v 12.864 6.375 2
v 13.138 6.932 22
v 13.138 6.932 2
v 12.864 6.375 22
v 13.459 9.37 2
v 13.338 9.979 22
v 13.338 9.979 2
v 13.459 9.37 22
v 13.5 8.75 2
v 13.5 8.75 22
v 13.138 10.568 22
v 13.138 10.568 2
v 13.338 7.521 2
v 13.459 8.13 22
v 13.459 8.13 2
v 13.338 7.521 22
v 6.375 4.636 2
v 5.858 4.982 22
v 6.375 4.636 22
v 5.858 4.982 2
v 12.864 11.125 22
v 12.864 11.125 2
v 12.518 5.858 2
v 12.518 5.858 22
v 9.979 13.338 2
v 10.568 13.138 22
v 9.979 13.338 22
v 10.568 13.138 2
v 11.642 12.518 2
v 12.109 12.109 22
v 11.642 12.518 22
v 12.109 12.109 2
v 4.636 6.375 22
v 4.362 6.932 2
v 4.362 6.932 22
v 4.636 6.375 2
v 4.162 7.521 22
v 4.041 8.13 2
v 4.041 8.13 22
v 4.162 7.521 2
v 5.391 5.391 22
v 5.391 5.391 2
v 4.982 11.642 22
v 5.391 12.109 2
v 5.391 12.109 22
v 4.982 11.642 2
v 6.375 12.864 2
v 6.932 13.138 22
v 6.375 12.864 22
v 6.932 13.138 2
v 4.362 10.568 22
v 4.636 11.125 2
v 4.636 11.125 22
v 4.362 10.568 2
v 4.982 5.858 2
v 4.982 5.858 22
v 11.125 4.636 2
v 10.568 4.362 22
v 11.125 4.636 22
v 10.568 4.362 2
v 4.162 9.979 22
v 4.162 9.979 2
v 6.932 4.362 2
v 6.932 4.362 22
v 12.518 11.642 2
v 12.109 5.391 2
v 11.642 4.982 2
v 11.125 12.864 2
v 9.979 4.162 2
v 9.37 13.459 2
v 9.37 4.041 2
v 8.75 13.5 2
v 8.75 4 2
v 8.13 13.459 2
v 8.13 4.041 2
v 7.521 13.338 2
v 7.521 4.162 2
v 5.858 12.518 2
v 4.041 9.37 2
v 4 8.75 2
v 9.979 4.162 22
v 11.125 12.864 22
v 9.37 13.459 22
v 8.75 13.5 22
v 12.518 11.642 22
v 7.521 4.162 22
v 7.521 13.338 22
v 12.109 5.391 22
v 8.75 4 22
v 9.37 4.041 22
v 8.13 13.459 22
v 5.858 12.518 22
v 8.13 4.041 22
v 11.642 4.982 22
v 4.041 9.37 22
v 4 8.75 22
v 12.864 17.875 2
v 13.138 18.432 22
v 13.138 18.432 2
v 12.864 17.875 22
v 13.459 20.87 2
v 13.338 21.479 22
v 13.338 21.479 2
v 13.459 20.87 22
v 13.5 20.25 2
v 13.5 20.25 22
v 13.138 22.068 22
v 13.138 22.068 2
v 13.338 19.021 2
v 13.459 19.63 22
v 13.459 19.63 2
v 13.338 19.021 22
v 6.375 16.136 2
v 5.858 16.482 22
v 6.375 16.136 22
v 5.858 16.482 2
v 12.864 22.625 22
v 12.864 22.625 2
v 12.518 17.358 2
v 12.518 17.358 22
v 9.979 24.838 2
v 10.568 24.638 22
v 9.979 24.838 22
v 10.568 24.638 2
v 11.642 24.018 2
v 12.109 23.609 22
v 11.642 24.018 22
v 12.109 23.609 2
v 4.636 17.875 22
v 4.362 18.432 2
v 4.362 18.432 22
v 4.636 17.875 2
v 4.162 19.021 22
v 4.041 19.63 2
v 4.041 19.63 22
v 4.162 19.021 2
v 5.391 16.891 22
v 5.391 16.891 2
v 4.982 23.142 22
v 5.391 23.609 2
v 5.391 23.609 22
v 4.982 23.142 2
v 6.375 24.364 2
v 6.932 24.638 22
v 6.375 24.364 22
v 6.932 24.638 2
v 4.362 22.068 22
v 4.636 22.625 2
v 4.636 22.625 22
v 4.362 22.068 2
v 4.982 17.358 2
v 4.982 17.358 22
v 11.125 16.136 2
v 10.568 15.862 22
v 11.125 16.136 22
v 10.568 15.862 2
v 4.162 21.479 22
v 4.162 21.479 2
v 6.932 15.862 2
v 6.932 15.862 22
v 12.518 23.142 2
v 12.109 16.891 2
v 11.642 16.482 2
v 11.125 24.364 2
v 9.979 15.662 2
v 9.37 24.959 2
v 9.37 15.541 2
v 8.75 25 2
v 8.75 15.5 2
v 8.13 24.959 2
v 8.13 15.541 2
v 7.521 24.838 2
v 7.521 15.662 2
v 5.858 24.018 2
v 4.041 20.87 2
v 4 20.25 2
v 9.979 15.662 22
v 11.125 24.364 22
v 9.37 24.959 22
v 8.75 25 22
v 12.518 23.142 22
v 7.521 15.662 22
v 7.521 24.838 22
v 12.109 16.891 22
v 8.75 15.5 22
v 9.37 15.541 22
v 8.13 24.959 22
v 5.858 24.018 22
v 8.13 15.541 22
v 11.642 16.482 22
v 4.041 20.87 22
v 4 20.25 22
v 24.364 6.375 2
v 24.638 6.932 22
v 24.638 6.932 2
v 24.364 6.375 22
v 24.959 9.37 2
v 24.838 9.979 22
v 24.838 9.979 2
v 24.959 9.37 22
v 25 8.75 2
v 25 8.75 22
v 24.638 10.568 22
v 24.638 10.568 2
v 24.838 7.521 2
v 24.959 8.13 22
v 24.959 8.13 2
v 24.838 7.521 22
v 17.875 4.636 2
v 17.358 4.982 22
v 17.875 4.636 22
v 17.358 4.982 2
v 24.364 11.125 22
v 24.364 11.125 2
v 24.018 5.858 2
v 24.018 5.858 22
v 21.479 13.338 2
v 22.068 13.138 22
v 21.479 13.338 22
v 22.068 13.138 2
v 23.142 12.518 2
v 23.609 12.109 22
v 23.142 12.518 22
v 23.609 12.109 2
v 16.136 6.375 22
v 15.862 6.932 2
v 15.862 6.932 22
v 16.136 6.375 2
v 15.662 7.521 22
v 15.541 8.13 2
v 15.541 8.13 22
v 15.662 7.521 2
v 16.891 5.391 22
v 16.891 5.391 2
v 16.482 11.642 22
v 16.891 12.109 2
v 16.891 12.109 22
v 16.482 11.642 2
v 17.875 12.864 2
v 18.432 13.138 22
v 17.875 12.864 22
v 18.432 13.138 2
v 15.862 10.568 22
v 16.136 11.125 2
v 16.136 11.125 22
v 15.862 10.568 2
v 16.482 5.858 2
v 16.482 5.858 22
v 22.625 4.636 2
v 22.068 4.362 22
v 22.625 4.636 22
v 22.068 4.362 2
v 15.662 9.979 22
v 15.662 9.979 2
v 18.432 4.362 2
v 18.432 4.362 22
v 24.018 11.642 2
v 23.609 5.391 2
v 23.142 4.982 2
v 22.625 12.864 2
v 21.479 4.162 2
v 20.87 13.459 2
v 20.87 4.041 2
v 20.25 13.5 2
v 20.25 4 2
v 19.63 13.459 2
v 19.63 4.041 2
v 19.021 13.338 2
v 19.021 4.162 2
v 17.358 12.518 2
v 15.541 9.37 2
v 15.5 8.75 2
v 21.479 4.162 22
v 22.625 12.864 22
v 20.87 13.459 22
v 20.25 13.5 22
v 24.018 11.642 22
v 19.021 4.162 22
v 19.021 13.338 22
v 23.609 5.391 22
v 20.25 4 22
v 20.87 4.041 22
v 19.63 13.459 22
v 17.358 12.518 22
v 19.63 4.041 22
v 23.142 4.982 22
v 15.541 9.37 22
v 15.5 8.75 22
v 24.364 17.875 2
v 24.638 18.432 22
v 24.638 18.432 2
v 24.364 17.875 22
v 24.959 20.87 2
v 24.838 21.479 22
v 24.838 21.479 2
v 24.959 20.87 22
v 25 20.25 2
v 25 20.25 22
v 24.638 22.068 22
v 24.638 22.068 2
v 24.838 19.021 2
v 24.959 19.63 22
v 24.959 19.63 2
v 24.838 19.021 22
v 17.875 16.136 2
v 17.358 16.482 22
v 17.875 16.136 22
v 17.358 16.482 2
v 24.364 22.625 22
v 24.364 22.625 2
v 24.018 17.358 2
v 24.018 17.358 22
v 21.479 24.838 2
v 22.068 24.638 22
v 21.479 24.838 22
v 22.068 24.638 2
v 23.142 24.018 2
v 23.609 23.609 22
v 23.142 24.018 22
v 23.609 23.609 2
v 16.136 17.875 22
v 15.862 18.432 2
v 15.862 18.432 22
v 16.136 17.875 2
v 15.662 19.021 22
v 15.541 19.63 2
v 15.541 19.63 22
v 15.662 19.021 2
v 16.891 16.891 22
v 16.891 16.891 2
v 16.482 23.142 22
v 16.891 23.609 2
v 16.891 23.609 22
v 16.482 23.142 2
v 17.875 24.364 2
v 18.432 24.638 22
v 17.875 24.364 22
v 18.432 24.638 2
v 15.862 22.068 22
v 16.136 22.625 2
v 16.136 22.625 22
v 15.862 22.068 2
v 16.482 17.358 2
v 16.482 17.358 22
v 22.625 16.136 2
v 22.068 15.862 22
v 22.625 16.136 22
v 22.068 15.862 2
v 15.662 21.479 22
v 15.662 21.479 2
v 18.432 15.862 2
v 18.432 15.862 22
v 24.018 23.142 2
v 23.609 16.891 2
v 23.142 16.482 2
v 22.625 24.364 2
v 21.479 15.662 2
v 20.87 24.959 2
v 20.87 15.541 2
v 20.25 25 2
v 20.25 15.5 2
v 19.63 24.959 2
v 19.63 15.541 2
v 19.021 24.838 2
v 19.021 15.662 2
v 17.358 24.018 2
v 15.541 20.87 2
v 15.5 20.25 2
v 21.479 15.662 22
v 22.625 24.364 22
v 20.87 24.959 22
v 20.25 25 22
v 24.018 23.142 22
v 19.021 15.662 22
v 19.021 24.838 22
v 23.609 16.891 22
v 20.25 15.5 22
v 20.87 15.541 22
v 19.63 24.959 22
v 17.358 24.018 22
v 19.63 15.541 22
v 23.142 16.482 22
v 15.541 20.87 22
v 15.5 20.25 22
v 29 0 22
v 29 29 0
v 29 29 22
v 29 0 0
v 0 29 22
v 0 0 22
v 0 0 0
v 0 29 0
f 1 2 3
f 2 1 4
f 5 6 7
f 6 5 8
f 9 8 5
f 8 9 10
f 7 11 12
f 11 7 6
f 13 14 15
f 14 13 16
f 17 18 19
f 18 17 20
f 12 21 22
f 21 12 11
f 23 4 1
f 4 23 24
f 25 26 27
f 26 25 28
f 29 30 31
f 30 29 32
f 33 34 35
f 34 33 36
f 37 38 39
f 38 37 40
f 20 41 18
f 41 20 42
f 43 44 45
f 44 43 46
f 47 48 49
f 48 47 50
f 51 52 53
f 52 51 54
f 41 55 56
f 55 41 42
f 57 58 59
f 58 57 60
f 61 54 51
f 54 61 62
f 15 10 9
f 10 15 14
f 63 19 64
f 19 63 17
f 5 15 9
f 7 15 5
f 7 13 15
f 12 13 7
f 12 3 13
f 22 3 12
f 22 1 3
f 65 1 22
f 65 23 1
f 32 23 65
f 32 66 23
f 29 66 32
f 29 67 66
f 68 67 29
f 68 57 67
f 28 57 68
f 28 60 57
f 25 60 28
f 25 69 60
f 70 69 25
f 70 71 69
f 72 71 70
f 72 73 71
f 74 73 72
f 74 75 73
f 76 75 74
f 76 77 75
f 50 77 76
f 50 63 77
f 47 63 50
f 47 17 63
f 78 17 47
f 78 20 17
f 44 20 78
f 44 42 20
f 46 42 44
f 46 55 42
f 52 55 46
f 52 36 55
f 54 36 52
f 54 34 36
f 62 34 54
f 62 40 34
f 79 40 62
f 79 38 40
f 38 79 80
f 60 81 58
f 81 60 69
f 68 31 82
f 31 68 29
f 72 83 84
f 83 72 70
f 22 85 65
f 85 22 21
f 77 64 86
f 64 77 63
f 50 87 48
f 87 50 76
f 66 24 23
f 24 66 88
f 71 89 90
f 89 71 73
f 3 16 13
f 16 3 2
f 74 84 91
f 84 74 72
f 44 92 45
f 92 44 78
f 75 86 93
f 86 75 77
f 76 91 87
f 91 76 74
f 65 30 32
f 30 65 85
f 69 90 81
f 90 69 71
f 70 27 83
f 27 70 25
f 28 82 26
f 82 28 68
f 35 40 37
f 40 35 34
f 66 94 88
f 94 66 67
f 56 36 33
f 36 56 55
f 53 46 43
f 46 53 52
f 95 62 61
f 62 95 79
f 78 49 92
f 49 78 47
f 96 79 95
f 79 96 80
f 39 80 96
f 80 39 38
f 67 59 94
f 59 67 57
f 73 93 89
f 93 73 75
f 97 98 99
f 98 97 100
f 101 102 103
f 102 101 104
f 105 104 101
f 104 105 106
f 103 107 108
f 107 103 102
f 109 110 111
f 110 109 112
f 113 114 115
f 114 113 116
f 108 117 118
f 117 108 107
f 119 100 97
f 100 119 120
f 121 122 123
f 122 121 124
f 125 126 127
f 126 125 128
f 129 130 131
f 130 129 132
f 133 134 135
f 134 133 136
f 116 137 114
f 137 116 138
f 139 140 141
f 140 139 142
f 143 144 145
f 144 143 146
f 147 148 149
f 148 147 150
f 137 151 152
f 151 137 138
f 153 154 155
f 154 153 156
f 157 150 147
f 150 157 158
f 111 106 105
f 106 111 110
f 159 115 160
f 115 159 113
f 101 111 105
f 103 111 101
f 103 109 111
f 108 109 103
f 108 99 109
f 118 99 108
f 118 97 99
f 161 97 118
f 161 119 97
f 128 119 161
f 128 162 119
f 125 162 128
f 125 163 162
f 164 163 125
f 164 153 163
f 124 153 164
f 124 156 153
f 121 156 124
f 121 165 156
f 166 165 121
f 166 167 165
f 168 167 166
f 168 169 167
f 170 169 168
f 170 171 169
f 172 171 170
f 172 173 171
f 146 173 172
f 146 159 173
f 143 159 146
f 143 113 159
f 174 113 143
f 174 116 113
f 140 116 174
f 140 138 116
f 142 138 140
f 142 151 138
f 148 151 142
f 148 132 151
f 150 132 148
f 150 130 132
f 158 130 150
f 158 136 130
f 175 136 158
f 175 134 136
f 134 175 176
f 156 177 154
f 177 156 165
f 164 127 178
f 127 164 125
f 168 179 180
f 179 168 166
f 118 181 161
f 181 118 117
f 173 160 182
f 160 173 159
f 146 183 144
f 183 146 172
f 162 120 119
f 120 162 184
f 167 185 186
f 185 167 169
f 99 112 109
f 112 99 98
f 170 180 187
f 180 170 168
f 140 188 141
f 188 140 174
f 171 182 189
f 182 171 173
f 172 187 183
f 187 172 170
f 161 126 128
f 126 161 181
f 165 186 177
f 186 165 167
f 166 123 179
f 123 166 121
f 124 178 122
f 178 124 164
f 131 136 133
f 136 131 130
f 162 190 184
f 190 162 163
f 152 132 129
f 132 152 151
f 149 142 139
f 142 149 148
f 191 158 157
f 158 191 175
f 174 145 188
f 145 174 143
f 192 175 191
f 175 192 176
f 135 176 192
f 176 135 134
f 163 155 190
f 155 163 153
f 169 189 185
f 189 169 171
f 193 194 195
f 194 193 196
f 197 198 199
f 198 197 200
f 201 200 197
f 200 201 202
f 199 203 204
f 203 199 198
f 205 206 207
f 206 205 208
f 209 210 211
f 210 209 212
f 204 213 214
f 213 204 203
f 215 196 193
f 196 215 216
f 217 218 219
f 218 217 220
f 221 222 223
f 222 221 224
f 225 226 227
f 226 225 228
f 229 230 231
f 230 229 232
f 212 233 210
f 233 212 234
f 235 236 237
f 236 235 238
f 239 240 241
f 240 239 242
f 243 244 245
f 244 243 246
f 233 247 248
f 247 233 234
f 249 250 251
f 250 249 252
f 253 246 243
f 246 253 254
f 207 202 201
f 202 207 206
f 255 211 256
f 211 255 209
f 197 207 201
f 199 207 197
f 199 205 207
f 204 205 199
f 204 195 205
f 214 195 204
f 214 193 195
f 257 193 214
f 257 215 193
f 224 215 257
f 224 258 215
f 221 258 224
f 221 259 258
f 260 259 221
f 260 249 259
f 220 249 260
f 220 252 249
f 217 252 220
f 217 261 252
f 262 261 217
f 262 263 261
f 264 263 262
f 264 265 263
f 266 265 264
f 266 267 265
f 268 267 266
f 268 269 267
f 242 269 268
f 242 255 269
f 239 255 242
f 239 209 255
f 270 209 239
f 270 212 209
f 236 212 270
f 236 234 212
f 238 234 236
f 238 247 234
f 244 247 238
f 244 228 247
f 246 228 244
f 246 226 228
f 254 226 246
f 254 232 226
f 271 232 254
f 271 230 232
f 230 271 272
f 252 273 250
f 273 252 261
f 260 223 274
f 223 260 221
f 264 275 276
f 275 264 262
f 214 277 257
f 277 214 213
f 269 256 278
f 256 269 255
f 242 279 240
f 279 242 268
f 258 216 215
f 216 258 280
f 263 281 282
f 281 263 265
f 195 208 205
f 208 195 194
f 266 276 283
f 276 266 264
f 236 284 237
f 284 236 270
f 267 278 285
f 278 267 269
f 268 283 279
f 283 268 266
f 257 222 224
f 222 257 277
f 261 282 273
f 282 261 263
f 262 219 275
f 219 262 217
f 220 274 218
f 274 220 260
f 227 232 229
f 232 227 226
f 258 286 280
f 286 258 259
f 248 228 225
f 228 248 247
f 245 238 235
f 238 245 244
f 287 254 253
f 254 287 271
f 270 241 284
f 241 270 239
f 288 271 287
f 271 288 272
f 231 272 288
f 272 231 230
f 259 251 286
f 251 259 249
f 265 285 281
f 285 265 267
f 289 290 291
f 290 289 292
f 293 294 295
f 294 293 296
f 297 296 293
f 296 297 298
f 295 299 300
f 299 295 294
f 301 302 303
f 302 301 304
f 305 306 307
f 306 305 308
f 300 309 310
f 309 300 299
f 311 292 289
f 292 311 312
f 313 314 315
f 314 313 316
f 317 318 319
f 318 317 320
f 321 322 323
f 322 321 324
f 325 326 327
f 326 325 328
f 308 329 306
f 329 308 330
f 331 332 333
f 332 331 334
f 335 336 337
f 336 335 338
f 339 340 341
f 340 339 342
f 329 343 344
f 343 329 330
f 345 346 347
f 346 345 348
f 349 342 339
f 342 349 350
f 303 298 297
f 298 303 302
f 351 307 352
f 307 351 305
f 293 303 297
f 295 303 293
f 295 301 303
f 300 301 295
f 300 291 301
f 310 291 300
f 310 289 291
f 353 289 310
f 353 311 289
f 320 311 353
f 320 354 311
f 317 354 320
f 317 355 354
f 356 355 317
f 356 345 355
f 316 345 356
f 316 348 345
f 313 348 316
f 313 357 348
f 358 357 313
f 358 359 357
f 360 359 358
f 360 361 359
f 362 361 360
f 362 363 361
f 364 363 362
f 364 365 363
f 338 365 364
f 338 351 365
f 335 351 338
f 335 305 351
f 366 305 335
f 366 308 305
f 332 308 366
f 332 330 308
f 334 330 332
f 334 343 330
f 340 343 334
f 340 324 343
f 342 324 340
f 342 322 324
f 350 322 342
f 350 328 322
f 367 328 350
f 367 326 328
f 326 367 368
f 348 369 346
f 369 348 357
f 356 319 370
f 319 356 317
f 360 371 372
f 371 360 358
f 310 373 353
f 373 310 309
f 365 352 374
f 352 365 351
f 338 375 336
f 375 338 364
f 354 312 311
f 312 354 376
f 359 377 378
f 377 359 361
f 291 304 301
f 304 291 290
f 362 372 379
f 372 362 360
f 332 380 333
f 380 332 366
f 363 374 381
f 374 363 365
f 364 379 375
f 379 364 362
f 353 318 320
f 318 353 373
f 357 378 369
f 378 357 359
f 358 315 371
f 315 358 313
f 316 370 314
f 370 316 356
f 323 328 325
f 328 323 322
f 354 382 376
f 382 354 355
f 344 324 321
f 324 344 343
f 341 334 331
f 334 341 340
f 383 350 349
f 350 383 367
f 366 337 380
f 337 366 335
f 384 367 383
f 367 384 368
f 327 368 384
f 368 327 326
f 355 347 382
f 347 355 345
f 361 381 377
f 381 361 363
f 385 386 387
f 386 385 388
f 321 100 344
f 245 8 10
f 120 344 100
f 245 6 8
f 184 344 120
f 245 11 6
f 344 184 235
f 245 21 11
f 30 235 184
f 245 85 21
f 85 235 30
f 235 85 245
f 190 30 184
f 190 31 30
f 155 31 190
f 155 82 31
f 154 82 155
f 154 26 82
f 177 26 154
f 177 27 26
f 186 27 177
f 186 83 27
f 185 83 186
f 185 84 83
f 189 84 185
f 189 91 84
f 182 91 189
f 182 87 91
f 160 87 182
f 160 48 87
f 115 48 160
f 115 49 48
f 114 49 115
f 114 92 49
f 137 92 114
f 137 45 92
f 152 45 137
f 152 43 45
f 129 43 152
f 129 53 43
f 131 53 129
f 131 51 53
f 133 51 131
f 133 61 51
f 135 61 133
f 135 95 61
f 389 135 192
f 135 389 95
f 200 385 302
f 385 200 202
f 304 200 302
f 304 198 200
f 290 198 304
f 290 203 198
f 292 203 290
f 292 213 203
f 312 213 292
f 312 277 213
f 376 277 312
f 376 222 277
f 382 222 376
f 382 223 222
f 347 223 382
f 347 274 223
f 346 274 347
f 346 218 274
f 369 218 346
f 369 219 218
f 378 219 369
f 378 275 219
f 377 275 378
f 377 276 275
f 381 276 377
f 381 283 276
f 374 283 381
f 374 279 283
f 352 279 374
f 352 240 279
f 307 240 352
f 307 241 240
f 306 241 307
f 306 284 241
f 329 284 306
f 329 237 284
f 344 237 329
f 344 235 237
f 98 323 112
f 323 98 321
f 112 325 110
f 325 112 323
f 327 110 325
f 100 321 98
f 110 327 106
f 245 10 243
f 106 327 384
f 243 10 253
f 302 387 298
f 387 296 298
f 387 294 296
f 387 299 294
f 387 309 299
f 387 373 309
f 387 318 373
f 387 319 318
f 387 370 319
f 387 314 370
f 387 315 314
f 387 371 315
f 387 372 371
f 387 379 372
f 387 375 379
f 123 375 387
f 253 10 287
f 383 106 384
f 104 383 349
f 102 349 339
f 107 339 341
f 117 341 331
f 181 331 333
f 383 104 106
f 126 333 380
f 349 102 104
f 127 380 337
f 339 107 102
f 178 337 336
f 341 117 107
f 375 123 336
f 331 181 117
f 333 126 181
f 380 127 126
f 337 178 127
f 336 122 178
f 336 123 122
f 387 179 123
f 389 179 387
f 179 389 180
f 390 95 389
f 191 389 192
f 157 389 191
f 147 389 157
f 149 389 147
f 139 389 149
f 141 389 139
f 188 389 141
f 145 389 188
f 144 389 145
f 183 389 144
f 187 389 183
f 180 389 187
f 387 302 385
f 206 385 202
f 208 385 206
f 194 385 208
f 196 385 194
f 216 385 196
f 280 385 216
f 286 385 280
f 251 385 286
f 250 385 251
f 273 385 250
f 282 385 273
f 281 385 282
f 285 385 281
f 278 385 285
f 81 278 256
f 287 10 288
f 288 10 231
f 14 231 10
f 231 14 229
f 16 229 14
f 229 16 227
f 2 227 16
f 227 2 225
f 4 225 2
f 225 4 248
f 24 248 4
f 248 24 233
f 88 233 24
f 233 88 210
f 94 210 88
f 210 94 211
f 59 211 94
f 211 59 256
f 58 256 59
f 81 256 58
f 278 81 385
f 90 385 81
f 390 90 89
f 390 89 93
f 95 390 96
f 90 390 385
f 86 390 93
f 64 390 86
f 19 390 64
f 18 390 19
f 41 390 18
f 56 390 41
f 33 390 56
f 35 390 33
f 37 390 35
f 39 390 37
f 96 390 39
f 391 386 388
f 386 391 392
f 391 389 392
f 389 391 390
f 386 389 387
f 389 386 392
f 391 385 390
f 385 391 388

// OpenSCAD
// 9mm 50rd ammo box — 2x2 hole test piece for fit verification
// Rounds sit tip-down; case rim (9.96mm) catches on top edge of hole.

hole_d   = 9.5;   // hole diameter — must clear case body, catch rim
wall     = 3;     // wall thickness on all sides
floor_t  = 2;     // floor thickness
depth    = 22;    // total tray depth (hole runs full depth, no bridging)
spacing  = 11.5;  // center-to-center hole spacing

cols = 2;
rows = 2;

tray_x = cols * spacing + 2 * wall;
tray_y = rows * spacing + 2 * wall;

difference() {
    cube([tray_x, tray_y, depth]);
    for (col = [0 : cols - 1], row = [0 : rows - 1]) {
        translate([
            wall + spacing * col + spacing / 2,
            wall + spacing * row + spacing / 2,
            floor_t
        ])
            cylinder(h = depth, d = hole_d, $fn = 48);
    }
}
